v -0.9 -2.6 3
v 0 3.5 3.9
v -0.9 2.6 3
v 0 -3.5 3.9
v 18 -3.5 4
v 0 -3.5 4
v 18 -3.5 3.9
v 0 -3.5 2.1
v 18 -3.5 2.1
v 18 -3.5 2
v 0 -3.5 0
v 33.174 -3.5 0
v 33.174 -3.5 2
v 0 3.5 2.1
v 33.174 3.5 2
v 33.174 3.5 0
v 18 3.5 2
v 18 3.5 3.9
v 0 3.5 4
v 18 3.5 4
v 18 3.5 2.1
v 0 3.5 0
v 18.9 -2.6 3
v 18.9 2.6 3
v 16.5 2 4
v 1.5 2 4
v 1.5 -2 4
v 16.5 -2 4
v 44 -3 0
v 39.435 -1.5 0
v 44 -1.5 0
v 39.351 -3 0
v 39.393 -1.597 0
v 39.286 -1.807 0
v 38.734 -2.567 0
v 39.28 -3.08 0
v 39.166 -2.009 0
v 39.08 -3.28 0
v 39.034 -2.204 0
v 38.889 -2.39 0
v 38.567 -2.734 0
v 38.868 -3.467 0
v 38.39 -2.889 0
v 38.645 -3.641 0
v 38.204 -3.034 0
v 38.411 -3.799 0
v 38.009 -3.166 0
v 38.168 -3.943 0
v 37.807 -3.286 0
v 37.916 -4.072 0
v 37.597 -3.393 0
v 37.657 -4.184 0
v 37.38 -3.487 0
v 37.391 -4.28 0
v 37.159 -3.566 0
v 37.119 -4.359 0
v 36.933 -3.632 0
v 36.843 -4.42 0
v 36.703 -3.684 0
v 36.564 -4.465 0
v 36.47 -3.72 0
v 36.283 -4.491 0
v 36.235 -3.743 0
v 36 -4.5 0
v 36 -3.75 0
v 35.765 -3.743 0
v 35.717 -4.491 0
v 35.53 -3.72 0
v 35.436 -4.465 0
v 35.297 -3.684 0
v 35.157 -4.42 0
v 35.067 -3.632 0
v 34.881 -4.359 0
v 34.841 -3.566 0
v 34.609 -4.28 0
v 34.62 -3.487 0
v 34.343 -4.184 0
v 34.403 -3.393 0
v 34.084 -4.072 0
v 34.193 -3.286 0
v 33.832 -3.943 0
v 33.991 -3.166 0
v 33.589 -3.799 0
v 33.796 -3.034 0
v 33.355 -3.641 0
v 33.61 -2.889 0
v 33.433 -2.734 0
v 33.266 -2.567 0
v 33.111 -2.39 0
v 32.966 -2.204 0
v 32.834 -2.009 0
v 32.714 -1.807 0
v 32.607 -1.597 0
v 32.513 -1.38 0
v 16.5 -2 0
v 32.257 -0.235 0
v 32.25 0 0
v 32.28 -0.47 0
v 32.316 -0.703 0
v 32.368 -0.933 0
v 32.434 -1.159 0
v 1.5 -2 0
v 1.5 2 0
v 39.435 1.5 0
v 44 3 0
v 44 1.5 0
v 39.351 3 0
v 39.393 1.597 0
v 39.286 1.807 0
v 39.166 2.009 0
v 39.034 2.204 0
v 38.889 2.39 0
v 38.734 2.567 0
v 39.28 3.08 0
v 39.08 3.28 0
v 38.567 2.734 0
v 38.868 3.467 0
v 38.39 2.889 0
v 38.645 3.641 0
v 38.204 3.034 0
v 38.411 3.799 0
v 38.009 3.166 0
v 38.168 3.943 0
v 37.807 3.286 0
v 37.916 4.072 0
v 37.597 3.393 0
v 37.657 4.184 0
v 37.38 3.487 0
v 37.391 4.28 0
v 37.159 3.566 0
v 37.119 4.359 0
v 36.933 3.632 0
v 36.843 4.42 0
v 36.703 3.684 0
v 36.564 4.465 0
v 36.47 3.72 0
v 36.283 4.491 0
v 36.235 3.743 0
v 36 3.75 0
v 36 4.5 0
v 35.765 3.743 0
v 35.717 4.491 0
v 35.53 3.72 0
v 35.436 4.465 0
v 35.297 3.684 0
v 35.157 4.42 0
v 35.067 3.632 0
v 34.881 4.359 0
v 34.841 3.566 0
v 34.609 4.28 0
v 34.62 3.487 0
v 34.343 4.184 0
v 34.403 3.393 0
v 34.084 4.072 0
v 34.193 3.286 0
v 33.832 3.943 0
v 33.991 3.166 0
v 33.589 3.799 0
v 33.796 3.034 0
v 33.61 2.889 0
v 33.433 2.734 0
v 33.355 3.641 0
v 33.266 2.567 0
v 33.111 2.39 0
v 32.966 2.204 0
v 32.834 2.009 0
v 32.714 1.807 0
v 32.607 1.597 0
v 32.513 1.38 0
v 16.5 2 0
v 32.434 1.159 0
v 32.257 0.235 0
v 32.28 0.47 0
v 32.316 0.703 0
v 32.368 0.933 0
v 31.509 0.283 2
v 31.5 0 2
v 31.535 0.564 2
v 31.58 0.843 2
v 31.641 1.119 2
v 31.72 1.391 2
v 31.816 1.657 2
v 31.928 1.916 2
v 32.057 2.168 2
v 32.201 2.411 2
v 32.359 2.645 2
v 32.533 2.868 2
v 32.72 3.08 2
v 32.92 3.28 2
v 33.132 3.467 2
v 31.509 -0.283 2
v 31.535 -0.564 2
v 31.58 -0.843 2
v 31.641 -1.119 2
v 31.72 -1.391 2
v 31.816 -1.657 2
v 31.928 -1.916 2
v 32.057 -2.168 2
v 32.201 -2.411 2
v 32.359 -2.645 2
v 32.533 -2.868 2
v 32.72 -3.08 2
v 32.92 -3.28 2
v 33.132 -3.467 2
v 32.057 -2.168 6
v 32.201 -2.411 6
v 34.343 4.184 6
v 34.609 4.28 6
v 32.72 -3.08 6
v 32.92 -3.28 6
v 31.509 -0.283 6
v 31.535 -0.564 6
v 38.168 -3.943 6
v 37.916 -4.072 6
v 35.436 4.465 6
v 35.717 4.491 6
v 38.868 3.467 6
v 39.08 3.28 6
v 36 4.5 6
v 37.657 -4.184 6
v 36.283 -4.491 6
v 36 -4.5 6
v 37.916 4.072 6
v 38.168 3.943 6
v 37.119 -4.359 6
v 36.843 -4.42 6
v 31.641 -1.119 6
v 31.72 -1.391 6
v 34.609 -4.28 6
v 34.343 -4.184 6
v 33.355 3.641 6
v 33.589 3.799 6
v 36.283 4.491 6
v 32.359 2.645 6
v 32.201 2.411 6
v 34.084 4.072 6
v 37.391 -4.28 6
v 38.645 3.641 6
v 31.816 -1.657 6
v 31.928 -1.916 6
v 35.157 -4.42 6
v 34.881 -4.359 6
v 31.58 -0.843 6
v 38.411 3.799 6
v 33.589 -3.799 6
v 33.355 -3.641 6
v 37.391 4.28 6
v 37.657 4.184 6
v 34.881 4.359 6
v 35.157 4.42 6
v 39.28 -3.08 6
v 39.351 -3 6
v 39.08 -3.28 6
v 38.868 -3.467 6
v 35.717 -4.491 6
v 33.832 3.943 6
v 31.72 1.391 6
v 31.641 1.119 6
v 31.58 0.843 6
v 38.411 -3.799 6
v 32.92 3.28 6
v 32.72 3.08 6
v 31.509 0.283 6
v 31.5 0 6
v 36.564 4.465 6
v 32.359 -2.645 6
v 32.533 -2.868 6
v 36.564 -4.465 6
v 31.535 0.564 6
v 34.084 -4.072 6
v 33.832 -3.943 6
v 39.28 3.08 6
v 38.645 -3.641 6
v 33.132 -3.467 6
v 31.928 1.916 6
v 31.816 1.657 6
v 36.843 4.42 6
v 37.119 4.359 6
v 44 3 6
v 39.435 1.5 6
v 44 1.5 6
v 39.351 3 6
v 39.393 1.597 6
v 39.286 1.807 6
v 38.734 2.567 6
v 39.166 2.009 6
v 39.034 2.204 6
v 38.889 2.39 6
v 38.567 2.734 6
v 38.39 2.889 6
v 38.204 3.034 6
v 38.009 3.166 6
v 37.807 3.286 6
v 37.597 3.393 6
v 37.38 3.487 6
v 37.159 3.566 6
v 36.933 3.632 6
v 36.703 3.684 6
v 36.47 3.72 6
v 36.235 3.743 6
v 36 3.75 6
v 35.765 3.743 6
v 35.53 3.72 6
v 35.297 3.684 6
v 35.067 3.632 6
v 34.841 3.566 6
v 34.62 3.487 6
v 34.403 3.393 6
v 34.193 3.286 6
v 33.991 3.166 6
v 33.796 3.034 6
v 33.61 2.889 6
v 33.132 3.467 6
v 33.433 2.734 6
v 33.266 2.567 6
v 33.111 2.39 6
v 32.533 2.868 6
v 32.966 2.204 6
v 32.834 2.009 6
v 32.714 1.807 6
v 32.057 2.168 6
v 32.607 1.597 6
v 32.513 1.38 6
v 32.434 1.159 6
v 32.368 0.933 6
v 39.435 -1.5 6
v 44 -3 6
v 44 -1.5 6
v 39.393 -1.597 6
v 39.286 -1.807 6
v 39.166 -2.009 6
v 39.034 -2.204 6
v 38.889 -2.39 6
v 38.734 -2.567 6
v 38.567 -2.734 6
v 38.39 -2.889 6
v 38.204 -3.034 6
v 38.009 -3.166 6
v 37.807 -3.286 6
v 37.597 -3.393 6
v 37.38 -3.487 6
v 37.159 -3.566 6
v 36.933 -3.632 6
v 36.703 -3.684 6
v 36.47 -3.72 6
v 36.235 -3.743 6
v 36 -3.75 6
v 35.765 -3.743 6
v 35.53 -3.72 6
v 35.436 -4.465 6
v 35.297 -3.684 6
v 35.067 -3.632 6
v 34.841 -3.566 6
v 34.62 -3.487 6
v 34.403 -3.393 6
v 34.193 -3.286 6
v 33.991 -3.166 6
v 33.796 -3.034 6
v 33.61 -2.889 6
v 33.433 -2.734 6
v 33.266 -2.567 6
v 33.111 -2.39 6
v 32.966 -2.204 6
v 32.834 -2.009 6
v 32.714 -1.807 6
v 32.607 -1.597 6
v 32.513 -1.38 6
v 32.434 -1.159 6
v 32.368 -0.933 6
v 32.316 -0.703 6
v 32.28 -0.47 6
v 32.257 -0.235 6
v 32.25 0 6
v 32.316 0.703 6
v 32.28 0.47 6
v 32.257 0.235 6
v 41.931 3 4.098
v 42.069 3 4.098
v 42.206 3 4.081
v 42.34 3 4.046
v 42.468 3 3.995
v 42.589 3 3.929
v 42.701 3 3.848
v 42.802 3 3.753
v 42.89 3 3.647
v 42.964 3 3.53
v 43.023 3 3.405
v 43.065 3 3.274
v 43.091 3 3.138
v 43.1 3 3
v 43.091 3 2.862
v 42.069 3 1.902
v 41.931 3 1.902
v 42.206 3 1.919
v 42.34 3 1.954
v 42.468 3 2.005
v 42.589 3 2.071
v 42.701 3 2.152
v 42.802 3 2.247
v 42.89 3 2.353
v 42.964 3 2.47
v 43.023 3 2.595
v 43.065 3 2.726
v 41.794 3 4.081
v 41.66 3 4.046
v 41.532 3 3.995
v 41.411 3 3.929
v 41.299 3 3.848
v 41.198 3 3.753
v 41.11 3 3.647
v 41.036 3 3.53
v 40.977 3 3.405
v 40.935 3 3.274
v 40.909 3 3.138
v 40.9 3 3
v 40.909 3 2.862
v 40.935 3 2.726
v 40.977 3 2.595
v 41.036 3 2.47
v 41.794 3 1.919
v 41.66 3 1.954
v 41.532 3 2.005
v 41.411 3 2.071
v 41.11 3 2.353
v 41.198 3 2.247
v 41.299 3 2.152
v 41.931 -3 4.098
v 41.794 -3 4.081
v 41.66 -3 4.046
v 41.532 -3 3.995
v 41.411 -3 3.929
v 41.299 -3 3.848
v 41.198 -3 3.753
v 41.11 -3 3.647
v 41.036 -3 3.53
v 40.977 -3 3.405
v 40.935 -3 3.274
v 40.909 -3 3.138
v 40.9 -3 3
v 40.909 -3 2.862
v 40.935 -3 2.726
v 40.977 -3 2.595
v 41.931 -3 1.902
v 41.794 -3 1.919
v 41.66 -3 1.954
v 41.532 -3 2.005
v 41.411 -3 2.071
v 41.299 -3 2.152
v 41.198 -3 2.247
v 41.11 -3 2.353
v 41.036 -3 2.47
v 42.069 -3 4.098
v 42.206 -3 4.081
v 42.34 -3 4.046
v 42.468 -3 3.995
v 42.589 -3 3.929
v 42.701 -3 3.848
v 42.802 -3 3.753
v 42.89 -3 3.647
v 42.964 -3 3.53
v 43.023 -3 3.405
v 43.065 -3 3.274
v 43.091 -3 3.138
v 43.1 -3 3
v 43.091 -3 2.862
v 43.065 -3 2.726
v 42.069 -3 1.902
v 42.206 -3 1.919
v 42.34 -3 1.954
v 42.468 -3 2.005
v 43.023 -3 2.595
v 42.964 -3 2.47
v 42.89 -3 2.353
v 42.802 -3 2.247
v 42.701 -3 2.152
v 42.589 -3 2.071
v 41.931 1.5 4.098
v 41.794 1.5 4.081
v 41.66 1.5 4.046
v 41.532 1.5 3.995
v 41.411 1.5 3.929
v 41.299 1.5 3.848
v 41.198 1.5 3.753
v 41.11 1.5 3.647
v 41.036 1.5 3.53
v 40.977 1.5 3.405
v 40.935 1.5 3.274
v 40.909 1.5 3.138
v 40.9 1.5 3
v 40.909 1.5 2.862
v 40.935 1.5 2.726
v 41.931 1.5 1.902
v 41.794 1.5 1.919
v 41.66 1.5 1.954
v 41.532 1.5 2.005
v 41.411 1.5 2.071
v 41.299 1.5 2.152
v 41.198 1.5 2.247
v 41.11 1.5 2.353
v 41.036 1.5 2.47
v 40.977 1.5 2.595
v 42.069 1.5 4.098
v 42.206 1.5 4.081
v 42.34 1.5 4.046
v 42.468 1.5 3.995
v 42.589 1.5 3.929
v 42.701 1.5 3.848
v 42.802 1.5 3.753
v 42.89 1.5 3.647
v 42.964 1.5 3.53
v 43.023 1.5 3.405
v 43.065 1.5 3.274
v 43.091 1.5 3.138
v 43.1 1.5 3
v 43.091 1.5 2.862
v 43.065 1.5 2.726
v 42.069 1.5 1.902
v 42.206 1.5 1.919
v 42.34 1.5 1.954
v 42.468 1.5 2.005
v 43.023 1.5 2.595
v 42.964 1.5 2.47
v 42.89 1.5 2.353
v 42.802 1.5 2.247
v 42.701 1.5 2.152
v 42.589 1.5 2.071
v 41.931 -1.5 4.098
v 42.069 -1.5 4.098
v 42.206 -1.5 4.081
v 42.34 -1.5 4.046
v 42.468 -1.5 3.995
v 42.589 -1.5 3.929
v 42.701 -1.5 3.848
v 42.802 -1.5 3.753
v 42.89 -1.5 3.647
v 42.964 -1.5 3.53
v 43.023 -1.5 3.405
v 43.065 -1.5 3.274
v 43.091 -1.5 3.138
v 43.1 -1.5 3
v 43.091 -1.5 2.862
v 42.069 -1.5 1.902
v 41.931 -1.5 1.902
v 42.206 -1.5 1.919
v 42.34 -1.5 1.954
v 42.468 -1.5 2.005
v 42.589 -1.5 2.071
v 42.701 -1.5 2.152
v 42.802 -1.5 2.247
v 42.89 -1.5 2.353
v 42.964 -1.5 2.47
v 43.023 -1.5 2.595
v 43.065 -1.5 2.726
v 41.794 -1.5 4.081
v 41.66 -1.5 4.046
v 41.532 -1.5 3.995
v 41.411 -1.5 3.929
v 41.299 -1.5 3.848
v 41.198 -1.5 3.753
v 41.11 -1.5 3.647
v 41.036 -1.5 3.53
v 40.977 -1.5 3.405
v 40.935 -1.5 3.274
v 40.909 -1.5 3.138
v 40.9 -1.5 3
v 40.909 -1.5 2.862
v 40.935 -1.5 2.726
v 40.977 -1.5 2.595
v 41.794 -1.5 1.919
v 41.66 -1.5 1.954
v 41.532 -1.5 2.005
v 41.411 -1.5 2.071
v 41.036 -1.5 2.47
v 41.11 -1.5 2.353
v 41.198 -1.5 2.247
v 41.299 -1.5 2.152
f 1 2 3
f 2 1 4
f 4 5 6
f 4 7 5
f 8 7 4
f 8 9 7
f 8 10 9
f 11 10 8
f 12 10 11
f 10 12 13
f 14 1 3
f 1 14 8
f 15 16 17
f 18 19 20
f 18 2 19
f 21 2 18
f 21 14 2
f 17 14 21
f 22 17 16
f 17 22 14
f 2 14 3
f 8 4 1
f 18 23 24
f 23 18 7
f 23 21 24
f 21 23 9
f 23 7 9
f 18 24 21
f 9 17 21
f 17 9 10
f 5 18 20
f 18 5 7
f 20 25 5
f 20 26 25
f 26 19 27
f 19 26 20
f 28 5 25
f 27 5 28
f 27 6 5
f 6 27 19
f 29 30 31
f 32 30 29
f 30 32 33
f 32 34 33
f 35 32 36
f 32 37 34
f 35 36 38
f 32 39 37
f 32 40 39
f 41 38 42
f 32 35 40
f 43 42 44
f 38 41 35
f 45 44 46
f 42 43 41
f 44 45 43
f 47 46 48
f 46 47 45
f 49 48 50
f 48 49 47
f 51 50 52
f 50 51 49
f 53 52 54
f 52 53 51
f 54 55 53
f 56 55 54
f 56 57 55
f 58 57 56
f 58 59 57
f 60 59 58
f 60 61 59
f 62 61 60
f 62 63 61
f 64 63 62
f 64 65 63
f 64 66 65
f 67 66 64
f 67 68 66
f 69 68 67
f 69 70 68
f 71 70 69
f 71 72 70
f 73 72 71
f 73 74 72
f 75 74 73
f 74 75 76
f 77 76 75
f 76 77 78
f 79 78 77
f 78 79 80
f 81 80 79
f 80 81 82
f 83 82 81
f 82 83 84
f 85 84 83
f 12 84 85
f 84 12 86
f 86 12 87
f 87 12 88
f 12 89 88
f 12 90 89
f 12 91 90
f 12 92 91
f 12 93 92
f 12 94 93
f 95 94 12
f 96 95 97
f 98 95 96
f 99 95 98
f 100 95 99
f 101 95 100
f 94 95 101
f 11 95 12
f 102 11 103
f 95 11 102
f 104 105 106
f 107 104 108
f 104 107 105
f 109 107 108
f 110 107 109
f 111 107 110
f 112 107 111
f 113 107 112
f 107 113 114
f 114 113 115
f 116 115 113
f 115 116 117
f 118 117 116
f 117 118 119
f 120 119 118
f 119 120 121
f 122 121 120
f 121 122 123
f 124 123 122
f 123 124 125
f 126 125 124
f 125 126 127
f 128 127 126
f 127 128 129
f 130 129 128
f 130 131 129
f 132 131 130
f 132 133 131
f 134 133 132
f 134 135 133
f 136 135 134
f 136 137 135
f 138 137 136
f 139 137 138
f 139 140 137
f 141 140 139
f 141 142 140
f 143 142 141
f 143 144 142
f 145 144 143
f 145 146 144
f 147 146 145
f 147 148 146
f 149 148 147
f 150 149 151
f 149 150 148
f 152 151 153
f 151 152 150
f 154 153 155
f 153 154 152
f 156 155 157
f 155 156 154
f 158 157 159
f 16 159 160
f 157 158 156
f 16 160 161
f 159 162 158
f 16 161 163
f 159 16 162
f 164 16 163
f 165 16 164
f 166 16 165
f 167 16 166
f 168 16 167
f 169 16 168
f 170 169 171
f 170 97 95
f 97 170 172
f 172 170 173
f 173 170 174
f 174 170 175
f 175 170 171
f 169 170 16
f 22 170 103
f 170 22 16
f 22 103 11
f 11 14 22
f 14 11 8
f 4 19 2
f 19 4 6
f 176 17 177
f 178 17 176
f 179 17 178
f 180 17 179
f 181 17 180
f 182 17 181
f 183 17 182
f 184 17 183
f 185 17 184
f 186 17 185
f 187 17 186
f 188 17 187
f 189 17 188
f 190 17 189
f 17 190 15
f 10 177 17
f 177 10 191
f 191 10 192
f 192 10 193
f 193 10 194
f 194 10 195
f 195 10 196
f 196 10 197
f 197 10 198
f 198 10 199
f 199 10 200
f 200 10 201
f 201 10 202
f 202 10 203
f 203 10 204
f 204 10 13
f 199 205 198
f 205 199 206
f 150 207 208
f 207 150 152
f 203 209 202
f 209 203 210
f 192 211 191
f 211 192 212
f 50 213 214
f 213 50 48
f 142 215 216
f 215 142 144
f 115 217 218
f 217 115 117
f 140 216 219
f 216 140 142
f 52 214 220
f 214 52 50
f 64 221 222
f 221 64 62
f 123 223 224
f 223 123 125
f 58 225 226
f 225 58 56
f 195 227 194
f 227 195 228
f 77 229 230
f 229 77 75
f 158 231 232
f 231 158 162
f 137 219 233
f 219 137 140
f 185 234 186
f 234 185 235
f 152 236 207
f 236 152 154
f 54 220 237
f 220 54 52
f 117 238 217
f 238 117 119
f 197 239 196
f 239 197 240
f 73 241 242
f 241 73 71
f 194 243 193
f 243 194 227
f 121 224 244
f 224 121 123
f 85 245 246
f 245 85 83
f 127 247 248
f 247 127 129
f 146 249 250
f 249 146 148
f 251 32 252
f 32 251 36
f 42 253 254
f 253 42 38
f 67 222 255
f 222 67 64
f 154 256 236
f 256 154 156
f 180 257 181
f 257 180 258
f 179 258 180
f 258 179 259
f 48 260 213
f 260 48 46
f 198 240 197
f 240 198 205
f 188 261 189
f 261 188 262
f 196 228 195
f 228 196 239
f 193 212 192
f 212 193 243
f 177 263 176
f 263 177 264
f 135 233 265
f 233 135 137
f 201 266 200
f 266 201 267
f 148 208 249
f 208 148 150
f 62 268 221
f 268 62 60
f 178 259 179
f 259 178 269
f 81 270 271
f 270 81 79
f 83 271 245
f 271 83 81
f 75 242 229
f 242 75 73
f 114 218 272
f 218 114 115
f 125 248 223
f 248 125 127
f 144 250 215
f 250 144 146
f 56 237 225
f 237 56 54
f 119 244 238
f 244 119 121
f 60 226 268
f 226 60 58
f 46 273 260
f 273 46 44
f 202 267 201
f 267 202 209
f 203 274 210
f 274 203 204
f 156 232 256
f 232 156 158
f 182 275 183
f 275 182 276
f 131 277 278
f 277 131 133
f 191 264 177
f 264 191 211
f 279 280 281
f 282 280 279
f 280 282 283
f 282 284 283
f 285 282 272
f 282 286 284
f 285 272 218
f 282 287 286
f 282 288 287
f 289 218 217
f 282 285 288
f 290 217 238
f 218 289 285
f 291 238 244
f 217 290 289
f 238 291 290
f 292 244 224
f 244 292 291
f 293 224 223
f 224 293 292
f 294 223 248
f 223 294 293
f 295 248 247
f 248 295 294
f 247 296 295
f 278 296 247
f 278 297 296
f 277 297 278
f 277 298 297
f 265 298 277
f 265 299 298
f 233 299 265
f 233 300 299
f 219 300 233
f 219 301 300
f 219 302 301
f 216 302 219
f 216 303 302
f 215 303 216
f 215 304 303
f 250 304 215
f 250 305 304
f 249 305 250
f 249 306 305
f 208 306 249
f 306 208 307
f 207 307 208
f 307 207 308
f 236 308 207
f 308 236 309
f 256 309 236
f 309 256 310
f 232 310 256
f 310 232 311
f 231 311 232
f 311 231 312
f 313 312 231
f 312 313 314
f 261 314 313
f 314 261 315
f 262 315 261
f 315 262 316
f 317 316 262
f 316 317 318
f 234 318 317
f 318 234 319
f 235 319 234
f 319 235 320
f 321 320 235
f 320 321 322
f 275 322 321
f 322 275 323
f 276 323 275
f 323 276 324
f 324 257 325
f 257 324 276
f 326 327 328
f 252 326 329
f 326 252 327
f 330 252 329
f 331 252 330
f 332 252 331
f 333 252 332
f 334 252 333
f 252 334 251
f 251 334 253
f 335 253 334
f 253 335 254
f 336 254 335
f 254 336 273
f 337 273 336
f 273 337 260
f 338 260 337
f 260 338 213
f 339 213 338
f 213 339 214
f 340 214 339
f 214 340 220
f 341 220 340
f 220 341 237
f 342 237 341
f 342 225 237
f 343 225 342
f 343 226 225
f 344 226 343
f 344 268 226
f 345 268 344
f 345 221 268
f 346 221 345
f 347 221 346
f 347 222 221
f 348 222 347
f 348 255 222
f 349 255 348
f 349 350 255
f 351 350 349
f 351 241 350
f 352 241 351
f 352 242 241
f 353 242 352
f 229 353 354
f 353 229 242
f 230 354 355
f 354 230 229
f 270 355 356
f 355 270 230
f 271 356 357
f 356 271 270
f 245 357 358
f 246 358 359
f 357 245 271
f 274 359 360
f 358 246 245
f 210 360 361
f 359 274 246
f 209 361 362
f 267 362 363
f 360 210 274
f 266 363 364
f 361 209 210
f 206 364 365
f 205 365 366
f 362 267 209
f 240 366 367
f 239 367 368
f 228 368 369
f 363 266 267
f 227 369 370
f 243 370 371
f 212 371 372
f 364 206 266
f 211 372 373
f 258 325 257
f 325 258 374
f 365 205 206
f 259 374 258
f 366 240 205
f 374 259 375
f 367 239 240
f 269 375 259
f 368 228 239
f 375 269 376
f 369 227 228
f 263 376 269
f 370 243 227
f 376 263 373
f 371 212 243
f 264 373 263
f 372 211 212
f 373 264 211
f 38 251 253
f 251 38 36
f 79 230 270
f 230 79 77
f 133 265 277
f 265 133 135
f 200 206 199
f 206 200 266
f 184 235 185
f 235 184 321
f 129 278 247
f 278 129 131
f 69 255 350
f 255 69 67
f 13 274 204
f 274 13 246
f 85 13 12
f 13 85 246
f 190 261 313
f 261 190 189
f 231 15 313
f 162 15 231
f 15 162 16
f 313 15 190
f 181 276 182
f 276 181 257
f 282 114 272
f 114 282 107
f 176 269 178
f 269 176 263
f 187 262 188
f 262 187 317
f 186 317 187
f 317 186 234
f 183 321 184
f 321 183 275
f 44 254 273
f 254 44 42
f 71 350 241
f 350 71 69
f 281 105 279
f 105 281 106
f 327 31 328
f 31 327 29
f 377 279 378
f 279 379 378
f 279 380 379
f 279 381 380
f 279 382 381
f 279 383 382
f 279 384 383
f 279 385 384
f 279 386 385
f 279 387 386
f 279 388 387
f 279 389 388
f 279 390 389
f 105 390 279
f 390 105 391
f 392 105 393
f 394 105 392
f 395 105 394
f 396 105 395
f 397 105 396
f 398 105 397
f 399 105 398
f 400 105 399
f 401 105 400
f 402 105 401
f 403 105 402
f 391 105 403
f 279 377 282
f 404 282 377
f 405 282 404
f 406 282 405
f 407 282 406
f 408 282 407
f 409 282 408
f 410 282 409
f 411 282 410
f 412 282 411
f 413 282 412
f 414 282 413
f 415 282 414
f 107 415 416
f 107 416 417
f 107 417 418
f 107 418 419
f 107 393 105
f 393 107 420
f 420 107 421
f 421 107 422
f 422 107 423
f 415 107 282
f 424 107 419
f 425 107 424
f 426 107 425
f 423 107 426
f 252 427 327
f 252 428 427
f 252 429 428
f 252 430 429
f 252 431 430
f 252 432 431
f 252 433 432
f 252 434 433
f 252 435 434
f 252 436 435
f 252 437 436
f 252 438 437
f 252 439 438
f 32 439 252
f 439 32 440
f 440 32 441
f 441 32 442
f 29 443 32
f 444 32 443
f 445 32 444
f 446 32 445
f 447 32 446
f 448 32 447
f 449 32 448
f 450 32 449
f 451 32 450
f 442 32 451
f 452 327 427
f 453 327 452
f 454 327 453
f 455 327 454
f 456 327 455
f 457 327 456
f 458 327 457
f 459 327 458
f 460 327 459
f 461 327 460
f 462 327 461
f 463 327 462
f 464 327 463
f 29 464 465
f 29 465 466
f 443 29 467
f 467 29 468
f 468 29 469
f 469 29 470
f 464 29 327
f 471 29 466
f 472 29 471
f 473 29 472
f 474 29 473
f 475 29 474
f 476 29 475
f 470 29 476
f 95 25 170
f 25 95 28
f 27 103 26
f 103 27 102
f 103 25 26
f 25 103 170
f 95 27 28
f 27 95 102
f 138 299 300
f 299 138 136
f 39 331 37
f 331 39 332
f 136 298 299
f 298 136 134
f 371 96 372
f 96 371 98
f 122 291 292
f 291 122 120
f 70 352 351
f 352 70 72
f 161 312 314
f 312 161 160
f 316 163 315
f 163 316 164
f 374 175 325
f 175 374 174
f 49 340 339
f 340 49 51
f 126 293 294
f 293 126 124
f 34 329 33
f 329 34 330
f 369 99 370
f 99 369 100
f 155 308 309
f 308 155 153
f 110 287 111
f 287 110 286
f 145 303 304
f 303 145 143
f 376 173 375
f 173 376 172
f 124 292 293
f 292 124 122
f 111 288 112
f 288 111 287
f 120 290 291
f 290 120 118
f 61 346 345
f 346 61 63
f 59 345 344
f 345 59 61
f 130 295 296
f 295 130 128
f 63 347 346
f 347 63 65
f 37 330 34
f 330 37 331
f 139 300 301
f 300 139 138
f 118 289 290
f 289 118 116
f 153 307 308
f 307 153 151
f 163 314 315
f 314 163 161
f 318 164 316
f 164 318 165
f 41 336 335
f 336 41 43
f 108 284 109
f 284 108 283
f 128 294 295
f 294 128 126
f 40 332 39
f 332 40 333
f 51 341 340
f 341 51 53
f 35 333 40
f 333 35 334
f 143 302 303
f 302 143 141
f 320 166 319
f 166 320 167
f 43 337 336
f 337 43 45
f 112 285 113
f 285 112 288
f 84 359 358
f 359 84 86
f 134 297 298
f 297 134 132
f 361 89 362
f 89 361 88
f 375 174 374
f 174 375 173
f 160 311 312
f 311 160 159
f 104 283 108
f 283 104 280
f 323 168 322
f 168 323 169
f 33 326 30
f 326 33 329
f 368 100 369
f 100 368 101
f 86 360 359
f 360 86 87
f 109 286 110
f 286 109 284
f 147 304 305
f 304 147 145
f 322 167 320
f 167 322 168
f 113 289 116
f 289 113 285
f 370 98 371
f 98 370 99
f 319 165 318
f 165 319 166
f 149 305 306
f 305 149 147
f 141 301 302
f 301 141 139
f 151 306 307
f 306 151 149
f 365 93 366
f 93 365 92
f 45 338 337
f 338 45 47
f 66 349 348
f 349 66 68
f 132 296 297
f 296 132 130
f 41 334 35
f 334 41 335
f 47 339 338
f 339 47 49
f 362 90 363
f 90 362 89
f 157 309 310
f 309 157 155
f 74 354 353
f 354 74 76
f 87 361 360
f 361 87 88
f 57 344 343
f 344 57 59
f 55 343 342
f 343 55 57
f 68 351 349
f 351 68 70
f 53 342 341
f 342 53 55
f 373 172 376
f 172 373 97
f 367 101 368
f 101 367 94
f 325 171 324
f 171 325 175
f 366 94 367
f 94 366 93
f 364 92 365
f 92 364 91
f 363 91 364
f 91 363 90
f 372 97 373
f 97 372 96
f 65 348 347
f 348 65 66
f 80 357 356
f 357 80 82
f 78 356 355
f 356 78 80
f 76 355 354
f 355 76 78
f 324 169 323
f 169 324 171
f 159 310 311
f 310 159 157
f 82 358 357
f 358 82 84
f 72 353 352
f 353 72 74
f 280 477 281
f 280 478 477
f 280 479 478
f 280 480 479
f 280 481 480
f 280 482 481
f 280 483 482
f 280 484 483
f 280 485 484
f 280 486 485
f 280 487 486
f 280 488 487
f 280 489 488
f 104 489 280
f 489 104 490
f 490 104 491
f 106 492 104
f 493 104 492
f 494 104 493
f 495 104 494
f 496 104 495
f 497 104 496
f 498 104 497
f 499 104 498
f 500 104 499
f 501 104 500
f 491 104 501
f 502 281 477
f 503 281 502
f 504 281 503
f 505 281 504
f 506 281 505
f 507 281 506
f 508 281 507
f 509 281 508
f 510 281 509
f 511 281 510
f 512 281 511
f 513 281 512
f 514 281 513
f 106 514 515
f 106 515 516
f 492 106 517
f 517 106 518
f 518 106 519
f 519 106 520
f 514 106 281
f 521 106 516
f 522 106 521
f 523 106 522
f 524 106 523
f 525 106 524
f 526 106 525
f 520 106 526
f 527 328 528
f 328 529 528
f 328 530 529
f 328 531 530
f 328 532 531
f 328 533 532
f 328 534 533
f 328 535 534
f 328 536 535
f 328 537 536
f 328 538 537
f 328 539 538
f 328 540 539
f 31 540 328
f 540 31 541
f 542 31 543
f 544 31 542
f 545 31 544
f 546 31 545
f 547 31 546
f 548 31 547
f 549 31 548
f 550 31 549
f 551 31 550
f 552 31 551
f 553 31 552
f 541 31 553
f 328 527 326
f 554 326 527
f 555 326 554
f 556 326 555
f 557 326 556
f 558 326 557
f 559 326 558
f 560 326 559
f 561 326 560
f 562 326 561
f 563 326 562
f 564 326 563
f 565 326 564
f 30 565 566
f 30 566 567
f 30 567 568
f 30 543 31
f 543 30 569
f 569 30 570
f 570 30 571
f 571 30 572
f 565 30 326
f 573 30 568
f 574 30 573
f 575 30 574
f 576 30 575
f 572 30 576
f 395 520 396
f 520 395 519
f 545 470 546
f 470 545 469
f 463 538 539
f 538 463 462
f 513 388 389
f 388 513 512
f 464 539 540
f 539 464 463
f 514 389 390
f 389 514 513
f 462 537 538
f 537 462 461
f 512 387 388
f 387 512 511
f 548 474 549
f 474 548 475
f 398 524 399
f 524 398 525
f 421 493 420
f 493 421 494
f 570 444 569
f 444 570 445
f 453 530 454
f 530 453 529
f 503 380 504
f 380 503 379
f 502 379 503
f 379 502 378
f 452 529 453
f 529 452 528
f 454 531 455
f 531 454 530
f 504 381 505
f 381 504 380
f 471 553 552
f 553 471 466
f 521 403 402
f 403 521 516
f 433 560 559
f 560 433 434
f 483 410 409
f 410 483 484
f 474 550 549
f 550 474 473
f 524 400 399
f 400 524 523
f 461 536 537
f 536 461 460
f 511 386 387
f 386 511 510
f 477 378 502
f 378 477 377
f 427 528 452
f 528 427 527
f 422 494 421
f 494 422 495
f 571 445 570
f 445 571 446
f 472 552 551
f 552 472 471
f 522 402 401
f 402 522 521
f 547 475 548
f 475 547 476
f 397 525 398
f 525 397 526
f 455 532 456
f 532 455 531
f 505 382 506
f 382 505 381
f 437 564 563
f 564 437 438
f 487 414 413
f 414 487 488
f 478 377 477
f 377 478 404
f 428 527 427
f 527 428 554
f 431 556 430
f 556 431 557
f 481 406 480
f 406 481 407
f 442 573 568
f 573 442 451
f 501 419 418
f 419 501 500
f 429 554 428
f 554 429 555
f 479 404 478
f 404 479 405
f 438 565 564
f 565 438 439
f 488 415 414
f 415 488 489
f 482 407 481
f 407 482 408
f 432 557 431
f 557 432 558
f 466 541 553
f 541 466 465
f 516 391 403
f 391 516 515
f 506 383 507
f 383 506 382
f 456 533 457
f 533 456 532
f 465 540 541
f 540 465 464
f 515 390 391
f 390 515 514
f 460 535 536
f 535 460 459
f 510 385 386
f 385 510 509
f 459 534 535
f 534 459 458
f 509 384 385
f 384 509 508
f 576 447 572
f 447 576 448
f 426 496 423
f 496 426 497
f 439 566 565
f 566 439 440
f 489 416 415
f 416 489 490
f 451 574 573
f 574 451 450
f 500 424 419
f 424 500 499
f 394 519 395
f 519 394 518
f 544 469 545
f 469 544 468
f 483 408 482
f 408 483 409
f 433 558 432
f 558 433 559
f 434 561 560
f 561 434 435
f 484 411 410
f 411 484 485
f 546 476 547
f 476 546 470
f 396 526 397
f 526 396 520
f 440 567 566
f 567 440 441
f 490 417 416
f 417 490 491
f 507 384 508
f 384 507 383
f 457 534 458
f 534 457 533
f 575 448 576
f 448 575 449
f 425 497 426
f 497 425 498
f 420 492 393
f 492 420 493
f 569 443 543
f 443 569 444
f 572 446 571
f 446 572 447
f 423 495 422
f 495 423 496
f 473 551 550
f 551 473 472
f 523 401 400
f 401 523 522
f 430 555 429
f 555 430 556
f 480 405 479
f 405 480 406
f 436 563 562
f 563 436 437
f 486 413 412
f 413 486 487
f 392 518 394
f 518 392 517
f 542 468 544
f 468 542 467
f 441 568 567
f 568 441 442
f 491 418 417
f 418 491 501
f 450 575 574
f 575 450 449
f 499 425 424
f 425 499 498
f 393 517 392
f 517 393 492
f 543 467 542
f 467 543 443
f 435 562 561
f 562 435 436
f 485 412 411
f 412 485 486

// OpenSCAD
// file: dimensions.scad
axle_top_diameter = 19.95;
axle_bottom_diameter = 21.4;
axle_top_height = 9.4;
axle_bottom_height = 3 + 5.2 + 4 + 2 + 6;
axle_hole_diameter = 13.2;
bottom_plate_height = 3;
rim_diameter = 66;
rim_height = 4.8;
rim_thickness = 1.5;
wheel_screw_diameter = 2;
wheel_thickness = 2;
o_ring_inner_diameter = 106;
o_ring_cross_section_diameter = 6;

bevel_gear_to_cup_fixing_thickness = 1.5;
bottom_bevel_gear_thickness = 4;
bevel_gear_backlash = 0.005;

// Detachable tools related constants
tool_magnet_width = 4;
tool_magnet_height = 4;
tool_magnet_length = 15;
tool_wall_thickness = 1.5;
tool_length = 36;
tool_bracket_height = 6;
tool_diameter = 7.5;
tool_hole_diameter = 2.2;
tool_angle = 20;
tool_magnet_distance_from_center = 78.2 / 2 + tool_wall_thickness - 3;
tool_distance_between_magnets = 18;
tool_angle_between_magnets = tool_distance_between_magnets * 360 / (2 * PI * tool_magnet_distance_from_center);
tool_count = 3;
tool_pin_diameter = 2;
tool_connecting_plate_width = 30;
tool_connecting_plate_length = 22;
tool_connecting_plate_thickness = 2.5;
tool_connecting_plate_screw_diameter = 3.1;

//echo(tool_angle_between_magnets); // 27.4288
// main file
include <dimensions.scad>

module rail() {
    difference() {
        rotate([90, 0, 0]) {
            cylinder(h = tool_magnet_width + 2 * tool_wall_thickness, d = tool_magnet_height / 2 - 0.2, center = true, $fn = 4);
        }
        // Slice of corners
        translate([-tool_magnet_height / 2, tool_magnet_width / 2 + tool_wall_thickness - tool_magnet_height / 2, -tool_magnet_height / 2]) {
            rotate([0, 0, 45]) {
                cube([50, 50, 50], center = false);
            }
        }
        translate([-tool_magnet_height / 2, -tool_magnet_width / 2 - tool_wall_thickness + tool_magnet_height / 2, -tool_magnet_height / 2]) {
            rotate([0, 0, -135]) {
                cube([50, 50, 50], center = false);
            }
        }
    }
}

module tool() {
    difference() {
        union() {
            // Magnet holder
            translate([0, -tool_magnet_width / 2 - tool_wall_thickness, 0]) {
                cube([tool_magnet_length + 2 * tool_wall_thickness, tool_magnet_width + 2 * tool_wall_thickness, tool_magnet_height]);
            }
            // Slider bottom
            translate([0, 0, tool_magnet_height * 3 / 4]) {
                rail();
            }
            // Slider top
            translate([tool_magnet_length + 2 * tool_wall_thickness, 0, tool_magnet_height * 3 / 4]) {
                rotate([0, 0, 180]) {
                    rail();
                }
            }
            // Tool holder
            translate([0, -tool_magnet_width / 2 - tool_wall_thickness, 0]) {
                cube([tool_length, tool_magnet_width + 2 * tool_wall_thickness, tool_magnet_height / 2]);
            }
            // Round bracket
            translate([tool_length, 0, 0]) {
                cylinder(h = tool_bracket_height, d = tool_diameter + tool_wall_thickness, $fn = 100);
            }
            // Tightener block
            translate([tool_length + 4, 0, tool_bracket_height / 2]) {
                cube([8, 6, tool_bracket_height], center = true);
            }
        }
        // Magnet hole
        translate([tool_wall_thickness, -tool_magnet_width / 2, -0.1]) {
            cube([tool_magnet_length, tool_magnet_width, tool_magnet_height + 1]);
        }
        // Round tool hole
        translate([tool_length, 0, -0.1]) {
            rotate([0, 0, 0]) {
                cylinder(h = 10, d = tool_diameter, $fn = 100);
            }
        }        
        // Tightener gap
        translate([tool_length + 4, 0, tool_bracket_height / 2]) {
            cube([9, 3, tool_bracket_height + 1], center = true);
        }
        // Tightener screw
        translate([tool_length + 6, 0, tool_bracket_height / 2]) {
            rotate([90, 0, 0]) {
                cylinder(h = tool_bracket_height + 1, d = tool_hole_diameter, center = true, $fn = 50);
            }    
        }
        /*translate([tool_length - 2.5, 0, -0.1]) {
            cylinder(h = tool_magnet_height, d = tool_hole_diameter, $fn = 50);
        }
        translate([tool_length - 12.5, 0, -0.1]) {
            cylinder(h = tool_magnet_height, d = tool_hole_diameter, $fn = 50);
        }*/
    }
}

tool();
